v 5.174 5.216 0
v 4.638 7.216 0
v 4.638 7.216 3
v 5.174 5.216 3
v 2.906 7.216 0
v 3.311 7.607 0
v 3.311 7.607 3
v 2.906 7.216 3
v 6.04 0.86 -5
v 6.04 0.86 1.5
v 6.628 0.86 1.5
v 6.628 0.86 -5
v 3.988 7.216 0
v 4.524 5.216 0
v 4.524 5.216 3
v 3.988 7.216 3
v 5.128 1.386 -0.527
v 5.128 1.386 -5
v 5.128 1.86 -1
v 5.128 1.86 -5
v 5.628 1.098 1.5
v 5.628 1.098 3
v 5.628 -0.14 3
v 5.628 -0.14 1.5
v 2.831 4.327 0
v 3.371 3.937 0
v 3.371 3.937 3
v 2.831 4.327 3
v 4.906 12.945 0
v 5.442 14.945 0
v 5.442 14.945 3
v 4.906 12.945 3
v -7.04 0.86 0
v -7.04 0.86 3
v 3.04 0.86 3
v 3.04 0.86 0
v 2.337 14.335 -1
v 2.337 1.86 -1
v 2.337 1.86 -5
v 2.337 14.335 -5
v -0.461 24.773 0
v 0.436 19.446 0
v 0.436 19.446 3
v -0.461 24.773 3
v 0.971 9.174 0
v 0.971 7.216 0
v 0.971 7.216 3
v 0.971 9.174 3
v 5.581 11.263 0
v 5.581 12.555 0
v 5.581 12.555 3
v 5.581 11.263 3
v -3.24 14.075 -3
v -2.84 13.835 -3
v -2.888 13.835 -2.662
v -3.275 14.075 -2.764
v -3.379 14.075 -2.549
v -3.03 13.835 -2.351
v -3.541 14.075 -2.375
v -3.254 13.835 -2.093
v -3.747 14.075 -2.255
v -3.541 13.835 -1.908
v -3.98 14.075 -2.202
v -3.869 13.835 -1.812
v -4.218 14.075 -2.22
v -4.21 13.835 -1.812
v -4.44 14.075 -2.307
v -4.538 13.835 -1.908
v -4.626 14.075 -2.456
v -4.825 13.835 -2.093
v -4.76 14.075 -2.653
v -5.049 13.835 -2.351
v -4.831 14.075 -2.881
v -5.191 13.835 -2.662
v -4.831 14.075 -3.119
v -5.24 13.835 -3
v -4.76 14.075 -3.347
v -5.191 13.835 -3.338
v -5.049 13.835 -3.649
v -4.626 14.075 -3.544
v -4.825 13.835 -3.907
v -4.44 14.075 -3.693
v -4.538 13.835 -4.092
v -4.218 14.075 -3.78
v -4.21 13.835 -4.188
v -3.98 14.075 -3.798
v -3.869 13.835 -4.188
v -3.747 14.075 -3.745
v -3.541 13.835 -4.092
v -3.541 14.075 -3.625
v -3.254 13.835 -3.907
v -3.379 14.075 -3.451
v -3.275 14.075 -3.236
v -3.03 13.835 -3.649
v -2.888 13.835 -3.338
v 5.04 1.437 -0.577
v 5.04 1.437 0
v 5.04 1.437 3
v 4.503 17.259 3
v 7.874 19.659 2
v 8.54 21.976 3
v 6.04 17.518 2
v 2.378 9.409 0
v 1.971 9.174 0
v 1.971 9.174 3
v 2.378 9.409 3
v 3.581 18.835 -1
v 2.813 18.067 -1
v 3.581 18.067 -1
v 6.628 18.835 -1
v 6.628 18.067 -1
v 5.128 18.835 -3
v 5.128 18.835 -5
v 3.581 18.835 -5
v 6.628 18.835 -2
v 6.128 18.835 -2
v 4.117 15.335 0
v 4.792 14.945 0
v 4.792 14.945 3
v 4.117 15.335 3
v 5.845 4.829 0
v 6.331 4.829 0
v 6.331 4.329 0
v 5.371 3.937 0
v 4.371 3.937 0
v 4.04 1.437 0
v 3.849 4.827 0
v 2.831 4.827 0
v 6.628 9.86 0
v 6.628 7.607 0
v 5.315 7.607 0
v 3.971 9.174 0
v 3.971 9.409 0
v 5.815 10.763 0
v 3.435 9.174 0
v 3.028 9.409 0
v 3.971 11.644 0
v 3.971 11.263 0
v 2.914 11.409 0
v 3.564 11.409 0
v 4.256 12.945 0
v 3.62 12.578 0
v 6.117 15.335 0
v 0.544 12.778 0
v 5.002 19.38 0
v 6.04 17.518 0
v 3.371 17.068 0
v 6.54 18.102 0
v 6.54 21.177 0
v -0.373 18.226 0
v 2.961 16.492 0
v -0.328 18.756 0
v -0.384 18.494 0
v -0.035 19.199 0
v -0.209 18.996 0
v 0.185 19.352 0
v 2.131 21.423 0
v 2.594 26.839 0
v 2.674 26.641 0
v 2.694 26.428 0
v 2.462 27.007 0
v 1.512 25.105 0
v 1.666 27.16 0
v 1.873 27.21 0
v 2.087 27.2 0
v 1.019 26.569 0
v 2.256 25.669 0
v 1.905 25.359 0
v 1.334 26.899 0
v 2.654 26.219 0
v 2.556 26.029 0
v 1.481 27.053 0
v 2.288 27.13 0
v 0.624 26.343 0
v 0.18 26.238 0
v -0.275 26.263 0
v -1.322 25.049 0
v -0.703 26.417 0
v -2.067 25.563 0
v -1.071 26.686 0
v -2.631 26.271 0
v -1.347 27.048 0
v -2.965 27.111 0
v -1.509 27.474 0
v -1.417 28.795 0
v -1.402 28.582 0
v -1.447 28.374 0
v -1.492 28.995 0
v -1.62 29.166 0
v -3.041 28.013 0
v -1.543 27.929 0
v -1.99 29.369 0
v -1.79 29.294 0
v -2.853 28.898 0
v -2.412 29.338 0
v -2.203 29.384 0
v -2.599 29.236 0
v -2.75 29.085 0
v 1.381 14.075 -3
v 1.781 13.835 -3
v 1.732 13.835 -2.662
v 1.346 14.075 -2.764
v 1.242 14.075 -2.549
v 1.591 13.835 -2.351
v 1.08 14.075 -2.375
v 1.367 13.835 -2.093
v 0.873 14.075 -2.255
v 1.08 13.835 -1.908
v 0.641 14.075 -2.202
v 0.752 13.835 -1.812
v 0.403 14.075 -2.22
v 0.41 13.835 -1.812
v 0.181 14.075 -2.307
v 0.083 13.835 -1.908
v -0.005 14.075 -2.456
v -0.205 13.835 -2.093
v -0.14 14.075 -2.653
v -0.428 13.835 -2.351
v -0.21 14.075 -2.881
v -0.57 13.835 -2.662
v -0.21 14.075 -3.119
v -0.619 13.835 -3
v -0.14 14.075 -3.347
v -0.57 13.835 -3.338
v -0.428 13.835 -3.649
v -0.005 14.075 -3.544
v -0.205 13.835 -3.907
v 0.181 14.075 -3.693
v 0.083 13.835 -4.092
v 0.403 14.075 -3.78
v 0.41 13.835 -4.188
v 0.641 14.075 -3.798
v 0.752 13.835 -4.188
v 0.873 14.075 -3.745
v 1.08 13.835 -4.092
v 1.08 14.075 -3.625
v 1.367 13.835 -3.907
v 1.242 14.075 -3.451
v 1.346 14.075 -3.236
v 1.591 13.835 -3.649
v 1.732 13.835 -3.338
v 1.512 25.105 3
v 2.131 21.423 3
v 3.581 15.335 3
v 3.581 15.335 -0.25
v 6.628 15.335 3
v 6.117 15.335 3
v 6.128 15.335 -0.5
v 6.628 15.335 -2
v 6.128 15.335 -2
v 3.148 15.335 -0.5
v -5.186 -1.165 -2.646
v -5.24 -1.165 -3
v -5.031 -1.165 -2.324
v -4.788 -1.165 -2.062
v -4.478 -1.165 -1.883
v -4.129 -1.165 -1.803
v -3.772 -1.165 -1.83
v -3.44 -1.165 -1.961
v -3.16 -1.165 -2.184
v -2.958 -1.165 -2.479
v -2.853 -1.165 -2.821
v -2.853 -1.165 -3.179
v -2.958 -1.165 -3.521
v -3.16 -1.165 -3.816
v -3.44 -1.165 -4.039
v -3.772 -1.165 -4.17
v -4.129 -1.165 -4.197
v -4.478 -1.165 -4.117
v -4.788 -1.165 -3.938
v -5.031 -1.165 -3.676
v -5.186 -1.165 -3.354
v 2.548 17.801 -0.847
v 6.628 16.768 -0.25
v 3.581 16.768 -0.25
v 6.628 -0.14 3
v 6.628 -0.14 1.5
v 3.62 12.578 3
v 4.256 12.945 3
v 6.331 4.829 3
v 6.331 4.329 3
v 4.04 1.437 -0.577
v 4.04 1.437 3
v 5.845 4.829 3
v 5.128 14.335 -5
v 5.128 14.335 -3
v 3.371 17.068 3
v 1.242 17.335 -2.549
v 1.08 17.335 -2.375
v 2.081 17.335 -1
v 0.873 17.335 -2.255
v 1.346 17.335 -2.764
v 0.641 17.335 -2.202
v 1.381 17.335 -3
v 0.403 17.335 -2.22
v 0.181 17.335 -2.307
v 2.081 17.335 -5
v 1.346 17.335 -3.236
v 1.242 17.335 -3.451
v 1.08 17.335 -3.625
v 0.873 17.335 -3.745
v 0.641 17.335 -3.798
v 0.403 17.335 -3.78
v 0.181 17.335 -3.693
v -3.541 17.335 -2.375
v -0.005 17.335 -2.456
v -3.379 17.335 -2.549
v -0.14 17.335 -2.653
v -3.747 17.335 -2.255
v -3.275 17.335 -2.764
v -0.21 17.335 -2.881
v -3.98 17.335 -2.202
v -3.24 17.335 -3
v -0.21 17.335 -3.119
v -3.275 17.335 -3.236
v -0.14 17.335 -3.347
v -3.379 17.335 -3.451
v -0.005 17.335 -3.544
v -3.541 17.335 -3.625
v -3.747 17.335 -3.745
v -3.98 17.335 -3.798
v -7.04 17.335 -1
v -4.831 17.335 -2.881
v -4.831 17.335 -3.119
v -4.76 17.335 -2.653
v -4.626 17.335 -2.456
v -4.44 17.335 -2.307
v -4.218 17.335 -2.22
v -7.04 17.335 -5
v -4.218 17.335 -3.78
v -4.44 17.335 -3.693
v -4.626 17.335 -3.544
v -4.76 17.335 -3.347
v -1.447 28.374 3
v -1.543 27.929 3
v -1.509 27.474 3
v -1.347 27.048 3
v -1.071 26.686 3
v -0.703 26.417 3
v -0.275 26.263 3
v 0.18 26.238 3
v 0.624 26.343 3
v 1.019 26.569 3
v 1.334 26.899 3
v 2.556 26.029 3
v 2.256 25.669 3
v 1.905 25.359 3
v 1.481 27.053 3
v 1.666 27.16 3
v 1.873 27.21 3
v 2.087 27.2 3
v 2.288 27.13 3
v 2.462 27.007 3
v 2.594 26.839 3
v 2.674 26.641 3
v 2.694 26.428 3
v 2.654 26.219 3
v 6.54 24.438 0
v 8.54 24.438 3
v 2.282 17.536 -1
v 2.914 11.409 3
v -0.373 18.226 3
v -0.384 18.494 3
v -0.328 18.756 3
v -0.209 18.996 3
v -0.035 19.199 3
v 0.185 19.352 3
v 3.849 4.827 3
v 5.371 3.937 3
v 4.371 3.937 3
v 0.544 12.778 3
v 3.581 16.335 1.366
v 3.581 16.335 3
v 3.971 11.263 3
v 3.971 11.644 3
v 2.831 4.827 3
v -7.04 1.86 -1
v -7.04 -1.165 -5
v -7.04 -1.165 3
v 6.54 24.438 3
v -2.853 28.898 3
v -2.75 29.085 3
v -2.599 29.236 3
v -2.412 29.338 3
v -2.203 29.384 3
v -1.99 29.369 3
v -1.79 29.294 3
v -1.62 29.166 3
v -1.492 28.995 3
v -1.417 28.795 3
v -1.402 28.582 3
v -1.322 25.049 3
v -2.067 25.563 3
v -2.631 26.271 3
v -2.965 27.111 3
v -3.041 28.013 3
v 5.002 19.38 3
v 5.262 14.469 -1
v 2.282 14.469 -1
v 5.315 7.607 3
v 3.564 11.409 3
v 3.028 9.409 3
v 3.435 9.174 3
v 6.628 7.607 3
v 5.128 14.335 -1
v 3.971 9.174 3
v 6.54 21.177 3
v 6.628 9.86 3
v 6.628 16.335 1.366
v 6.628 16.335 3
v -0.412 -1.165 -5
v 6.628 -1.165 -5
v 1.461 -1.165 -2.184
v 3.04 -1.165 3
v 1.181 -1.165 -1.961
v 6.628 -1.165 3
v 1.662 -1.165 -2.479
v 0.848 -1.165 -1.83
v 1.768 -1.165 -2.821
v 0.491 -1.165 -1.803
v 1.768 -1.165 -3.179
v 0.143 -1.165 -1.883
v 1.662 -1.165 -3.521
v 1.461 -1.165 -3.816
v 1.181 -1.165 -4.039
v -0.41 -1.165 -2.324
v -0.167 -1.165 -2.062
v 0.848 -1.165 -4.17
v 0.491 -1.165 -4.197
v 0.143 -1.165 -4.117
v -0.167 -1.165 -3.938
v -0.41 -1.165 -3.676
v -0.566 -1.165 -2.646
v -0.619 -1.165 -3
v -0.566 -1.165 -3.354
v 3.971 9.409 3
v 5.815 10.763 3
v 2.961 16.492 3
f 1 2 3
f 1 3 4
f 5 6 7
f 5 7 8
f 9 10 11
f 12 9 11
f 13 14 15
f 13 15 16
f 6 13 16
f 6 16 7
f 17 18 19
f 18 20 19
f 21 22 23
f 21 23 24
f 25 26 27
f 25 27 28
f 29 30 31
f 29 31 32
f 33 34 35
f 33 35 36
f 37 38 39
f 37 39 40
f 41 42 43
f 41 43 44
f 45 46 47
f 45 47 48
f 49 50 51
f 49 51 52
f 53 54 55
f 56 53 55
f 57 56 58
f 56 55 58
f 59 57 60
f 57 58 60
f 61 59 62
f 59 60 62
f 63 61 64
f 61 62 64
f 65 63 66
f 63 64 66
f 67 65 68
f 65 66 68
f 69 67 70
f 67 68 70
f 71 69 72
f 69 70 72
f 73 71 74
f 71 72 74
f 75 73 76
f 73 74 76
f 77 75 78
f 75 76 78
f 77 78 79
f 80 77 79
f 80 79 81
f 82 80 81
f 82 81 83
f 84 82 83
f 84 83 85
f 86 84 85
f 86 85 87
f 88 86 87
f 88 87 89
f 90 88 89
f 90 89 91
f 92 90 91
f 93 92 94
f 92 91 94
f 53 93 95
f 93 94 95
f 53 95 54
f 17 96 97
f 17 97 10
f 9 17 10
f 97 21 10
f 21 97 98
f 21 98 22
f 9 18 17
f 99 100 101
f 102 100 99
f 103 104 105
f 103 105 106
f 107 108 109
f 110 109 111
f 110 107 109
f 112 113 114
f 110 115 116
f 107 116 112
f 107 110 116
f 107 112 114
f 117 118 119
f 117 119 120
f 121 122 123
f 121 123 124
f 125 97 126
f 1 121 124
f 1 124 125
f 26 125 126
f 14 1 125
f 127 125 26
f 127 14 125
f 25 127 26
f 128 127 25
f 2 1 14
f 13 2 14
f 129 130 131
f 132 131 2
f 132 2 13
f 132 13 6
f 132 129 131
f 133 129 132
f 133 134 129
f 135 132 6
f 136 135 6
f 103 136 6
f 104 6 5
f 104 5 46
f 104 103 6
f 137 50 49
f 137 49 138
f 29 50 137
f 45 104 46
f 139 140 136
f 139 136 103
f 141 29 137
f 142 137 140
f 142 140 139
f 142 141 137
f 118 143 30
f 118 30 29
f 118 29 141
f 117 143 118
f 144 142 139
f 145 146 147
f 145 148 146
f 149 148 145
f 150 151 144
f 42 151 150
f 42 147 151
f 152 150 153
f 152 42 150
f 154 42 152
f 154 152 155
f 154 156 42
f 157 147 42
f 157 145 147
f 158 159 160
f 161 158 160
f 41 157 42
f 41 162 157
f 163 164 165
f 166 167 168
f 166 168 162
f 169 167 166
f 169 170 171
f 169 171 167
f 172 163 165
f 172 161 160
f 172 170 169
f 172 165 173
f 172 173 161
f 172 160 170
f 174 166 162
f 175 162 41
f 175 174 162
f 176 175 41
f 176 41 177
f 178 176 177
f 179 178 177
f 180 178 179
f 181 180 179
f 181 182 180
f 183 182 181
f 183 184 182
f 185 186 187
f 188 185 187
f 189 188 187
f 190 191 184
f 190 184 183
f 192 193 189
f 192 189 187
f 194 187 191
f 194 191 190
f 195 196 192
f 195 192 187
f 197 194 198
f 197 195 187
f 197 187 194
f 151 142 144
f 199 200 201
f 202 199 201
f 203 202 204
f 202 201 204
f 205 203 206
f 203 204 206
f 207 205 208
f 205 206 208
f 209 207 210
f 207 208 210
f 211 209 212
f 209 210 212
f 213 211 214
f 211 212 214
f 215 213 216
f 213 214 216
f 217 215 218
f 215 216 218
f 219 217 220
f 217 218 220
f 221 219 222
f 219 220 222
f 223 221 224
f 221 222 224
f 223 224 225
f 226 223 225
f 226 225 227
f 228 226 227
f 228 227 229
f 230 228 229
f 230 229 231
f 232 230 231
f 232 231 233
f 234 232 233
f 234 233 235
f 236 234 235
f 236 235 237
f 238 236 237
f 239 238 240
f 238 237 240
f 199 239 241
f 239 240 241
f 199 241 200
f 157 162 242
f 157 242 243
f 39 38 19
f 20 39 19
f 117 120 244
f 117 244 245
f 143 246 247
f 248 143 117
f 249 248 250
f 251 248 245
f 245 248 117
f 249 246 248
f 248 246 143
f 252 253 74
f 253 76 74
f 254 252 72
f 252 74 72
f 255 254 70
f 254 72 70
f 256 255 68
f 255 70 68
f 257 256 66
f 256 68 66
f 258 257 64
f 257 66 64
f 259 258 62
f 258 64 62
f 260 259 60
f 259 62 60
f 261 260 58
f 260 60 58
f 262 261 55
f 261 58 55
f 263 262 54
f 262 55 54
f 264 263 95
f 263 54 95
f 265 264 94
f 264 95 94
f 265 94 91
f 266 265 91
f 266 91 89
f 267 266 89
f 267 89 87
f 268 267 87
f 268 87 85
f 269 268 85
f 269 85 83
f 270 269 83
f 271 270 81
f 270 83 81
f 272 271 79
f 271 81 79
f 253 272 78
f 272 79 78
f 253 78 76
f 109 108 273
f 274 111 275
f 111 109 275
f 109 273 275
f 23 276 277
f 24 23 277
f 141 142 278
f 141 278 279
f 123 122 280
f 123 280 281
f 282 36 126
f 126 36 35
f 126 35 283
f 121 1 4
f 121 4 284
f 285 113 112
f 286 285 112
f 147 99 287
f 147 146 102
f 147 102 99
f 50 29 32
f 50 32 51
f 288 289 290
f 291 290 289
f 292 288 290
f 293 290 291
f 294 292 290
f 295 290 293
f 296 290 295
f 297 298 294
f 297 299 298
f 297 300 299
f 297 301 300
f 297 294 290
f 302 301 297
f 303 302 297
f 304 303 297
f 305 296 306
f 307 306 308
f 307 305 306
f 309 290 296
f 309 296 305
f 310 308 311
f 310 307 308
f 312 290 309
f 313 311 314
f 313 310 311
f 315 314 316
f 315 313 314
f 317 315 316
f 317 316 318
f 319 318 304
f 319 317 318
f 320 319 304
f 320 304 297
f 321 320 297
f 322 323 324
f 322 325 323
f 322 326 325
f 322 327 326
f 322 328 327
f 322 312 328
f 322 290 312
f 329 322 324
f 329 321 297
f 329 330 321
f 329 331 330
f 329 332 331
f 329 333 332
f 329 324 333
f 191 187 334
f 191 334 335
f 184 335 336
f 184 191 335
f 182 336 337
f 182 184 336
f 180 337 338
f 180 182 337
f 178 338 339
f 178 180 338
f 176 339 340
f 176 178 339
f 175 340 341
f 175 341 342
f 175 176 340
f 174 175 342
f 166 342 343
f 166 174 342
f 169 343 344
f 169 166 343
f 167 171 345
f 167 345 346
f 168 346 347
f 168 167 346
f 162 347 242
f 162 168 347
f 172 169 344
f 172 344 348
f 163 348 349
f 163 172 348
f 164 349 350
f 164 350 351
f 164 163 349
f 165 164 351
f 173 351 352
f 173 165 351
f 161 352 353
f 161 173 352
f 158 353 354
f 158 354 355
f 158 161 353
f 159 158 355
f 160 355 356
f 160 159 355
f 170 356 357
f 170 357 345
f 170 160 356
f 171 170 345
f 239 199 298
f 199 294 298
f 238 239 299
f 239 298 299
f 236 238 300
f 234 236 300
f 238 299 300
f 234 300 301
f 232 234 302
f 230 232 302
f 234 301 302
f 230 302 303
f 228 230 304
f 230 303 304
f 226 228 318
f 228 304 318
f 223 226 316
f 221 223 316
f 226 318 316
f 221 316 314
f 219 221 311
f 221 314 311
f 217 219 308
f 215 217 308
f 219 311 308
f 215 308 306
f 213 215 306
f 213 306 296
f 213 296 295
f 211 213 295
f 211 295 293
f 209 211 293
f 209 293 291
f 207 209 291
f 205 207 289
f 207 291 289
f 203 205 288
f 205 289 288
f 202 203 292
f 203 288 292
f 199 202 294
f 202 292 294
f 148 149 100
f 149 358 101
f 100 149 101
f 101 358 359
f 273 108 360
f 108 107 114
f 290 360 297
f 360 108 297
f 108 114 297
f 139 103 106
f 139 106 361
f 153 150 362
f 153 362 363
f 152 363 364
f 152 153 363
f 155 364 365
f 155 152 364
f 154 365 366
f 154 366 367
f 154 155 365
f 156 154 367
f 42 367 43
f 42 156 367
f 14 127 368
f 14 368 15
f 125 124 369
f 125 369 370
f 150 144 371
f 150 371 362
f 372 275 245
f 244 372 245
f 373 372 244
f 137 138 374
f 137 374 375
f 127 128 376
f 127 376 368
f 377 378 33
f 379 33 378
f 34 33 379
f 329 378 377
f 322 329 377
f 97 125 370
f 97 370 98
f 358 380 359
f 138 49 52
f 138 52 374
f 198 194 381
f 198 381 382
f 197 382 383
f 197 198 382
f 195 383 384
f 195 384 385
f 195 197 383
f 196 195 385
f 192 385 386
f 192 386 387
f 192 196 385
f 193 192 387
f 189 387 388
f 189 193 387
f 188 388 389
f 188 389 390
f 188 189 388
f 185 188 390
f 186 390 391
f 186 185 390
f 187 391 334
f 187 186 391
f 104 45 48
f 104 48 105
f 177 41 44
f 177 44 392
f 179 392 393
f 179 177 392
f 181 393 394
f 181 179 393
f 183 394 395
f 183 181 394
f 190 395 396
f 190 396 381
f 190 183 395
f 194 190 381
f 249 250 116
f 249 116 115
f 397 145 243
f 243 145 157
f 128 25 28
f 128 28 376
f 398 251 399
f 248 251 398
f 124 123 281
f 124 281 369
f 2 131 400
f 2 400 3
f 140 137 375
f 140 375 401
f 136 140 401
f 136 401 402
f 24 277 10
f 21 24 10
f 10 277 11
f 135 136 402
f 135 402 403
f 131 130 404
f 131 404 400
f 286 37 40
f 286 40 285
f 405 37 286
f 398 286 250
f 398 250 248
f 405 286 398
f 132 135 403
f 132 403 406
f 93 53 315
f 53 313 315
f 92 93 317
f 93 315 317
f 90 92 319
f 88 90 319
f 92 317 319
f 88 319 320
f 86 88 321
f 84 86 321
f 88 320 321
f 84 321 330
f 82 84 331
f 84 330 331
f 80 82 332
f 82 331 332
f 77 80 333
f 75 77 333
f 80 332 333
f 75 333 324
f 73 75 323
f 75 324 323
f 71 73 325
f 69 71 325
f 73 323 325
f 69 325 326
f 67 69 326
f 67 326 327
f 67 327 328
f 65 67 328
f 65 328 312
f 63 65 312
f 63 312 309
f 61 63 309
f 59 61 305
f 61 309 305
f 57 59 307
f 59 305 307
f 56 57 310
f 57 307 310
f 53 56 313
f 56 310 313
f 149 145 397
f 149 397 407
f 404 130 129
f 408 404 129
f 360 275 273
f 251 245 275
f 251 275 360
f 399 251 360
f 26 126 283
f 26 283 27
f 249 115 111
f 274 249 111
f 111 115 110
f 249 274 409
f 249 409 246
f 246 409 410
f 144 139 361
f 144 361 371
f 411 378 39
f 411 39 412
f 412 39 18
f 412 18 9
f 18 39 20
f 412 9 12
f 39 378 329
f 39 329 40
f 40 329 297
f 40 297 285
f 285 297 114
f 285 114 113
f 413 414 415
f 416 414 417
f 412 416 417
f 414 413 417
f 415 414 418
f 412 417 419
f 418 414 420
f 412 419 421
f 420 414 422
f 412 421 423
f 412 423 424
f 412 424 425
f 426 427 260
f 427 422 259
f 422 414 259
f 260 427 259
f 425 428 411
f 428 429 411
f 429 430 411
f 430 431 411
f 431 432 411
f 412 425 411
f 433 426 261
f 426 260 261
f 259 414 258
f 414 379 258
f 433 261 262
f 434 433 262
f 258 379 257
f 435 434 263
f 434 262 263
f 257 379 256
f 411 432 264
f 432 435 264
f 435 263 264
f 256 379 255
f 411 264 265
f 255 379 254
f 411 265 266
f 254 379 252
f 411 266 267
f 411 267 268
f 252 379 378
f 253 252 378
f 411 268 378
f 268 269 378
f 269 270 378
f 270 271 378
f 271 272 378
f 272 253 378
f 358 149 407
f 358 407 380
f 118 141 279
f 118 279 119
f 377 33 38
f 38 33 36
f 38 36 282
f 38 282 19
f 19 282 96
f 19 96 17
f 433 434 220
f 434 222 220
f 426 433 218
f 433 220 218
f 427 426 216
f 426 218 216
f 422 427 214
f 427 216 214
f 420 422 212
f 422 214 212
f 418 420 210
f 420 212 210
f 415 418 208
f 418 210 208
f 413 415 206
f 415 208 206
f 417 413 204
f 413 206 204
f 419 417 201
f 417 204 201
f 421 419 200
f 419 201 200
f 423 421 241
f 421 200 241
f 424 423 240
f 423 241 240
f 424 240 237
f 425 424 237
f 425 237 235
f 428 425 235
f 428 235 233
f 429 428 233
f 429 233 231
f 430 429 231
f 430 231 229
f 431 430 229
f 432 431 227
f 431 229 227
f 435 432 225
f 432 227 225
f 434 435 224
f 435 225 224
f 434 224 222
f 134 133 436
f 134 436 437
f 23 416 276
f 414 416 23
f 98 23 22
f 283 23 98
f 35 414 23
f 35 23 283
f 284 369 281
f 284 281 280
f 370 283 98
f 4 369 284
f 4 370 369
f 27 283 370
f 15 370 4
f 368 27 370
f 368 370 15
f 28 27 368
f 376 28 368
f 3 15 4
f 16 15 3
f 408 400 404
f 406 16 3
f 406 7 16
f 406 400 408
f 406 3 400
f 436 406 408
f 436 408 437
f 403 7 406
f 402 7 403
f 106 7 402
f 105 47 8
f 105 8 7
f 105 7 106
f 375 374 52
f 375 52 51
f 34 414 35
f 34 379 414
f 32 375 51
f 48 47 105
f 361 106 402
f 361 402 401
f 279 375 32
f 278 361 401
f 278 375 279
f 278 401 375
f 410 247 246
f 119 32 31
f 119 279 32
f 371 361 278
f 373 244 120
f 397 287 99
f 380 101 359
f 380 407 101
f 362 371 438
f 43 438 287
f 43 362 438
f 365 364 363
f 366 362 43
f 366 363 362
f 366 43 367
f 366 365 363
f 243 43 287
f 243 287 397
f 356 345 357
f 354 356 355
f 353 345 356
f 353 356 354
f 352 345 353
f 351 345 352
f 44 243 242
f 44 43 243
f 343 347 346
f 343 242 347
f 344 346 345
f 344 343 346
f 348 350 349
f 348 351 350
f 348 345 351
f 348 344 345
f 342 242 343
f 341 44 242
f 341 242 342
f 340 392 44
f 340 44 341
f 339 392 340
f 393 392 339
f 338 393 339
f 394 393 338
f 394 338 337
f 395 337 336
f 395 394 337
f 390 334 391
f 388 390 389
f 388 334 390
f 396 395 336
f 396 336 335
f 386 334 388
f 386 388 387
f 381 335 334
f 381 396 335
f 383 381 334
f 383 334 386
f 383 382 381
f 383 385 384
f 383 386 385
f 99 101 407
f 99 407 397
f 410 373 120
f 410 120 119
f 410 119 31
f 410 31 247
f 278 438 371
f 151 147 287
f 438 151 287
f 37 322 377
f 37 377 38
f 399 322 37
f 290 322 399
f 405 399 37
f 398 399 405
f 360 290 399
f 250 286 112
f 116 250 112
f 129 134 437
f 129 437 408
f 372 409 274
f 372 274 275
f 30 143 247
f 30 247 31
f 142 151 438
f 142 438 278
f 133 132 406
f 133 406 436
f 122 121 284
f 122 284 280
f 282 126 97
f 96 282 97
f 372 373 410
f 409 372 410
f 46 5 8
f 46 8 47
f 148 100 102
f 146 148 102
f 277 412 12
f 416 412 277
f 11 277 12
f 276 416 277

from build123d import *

# Parameters (mm, degrees)
BOSS_SWITCH_BODY_DEPTH                         = 3
SKETCH1_W                                      = 4
SKETCH1_H                                      = 3.5
BOSS_FLANGE_WIDTH_DEPTH                        = 5
BOSS_FLANGE_HEIGHT_REACH                       = 38.166
SKETCH2_W                                      = 4
SKETCH2_H                                      = 2
SKETCH2_W_2                                    = 8
SKETCH2_H_2                                    = 2.024975669
CUT_UP_TO_DOWN_DERAILLEUR_CLEARANCE_REACH      = 23.862
SKETCH10_W                                     = 2.453096586
SKETCH10_H                                     = 3
SKETCH17_W                                     = 12.1675
SKETCH17_H                                     = 4
BOSS_FLANGE_SUPPORT_DEPTH                      = 14.475024331
TAP_DRILL_FOR_M2X0_4_TAP1_D                    = 1.6
M2_CLEARANCE_HOLE2_D                           = 2.4
M2_CLEARANCE_HOLE2_DEPTH                       = 15
M2_CLEARANCE_HOLE2_TIP                         = 0.721032743
CUT_UP_TO_DOWN_CANTILEVER_SLOPE_REACH          = 31.347
CUT_DOWN_TO_UP_DERAILLEUR_CLEARANCE_DEPTH      = 33.69867621
CUT_DOWN_TO_UP_DERAILLEUR_CLEARANCE_DEPTH_BACK = 33.69867621
CHAMFER_FLANGE_SUPPORT_SIZE                    = 1.5
CHAMFER_FLANGE_SUPPORT_2_SIZE                  = 1
CHAMFER_FLANGE_SUPPORT_3_SIZE                  = 1
SKETCH18_W                                     = 1.5
SKETCH18_H                                     = 1.577328106
CUT_DOWN_TO_UP_DERAILLEUR_CLEARANCE_2_DEPTH    = 1
SKETCH19_W                                     = 3.046903414
SKETCH19_H                                     = 2.563581512
CUT_UP_TO_DOWN_CANTILEVER_CLEARANCE_DEPTH      = 1
CHAMFER1_SIZE                                  = 1
CHAMFER1_SIZE_2                                = 1.732050808
CHAMFER3_SIZE                                  = 0.75
CHAMFER3_SIZE_2                                = 1.299038106
CHAMFER4_SIZE                                  = 0.866025404
CHAMFER4_SIZE2                                 = 0.5
CHAMFER5_SIZE                                  = 0.5
CHAMFER6_SIZE                                  = 2.5
CHAMFER7_SIZE                                  = 1
CUT_EXTRUDE3_REACH                             = 33.008
CHAMFER8_SIZE                                  = 0.5
CHAMFER8_SIZE2                                 = 1.366025404
SKETCH23_W                                     = 2.791062273
SKETCH23_H                                     = 12.475024331
CUT_EXTRUDE4_DEPTH                             = 31.862053717


# Some blends are built 0.0001 mm under size
with BuildPart() as part:
    # Sketch-SwitchBossUp → Boss-Switch Body (new body)
    with BuildSketch(Plane.XY):
        with BuildLine():
            Line((6.540476927, 21.177422148), (6.540476927, 24.438379064))
            Line((6.540476927, 24.438379064), (8.540476927, 24.438379064))
            Line((8.540476927, 24.438379064), (8.540476927, 20.438379064))
            Line((8.540476927, 20.438379064), (6.040476927, 17.517528279))
            Line((6.040476927, 17.517528279), (2.878366495, 16.985217616))
            Line((2.878366495, 16.985217616), (3.620297651, 12.577888564))
            Line((3.620297651, 12.577888564), (4.256080915, 12.944958203))
            Line((4.256080915, 12.944958203), (4.791964496, 14.944962169))
            Line((4.791964496, 14.944962169), (4.116925685, 15.334689347))
            Line((4.116925685, 15.334689347), (3.581073513, 15.334689347))
            Line((3.581073513, 15.334689347), (3.581073513, 16.334689347))
            Line((3.581073513, 16.334689347), (6.857327822, 16.334689347))
            Line((6.857327822, 16.334689347), (13.441607507, 16.334689347))
            Line((13.441607507, 16.334689347), (13.441607507, -1.165310653))
            Line((13.441607507, -1.165310653), (5.040476927, -1.165310653))
            Line((5.040476927, -1.165310653), (3.040476927, -1.165310653))
            Line((3.040476927, -1.165310653), (3.040476927, 0.859665016))
            Line((3.040476927, 0.859665016), (4.040476927, 1.437015286))
            Line((4.040476927, 1.437015286), (3.370603946, 3.937015286))
            Line((3.370603946, 3.937015286), (2.83114552, 4.326718942))
            Line((2.83114552, 4.326718942), (2.83114552, 4.826718942))
            Line((2.83114552, 4.826718942), (3.58114552, 4.826718942))
            Line((3.58114552, 4.826718942), (3.849107629, 4.826718942))
            Line((3.849107629, 4.826718942), (4.524094713, 5.216429578))
            Line((4.524094713, 5.216429578), (3.988181525, 7.216425611))
            Line((3.988181525, 7.216425611), (3.311378308, 7.607171452))
            Line((3.311378308, 7.607171452), (2.9061262, 7.216422599))
            Line((2.9061262, 7.216422599), (0.971280482, 7.216422599))
            Line((0.971280482, 7.216422599), (0.971280482, 9.174382361))
            Line((0.971280482, 9.174382361), (1.971280482, 9.174382361))
            Line((1.971280482, 9.174382361), (2.378329551, 9.409396267))
            Line((2.378329551, 9.409396267), (2.914213132, 11.409400234))
            Line((2.914213132, 11.409400234), (0.544476723, 12.777544801))
            Line((0.544476723, 12.777544801), (-0.372784255, 18.226393961))
            ThreePointArc((-0.372784255, 18.226393961), (-0.209313172, 18.996084896), (0.435897335, 19.446473985))
            Line((0.435897335, 19.446473985), (-0.46073685, 24.772792819))
            ThreePointArc((-0.46073685, 24.772792819), (-2.630501593, 26.270619745), (-2.852546321, 28.897797067))
            ThreePointArc((-2.852546321, 28.897797067), (-1.887813913, 29.338582026), (-1.447028953, 28.373849618))
            ThreePointArc((-1.447028953, 28.373849618), (-0.703448682, 26.416936722), (1.333779254, 26.898727173))
            ThreePointArc((1.333779254, 26.898727173), (2.379722745, 27.074801628), (2.555797201, 26.028858137))
            ThreePointArc((2.555797201, 26.028858137), (2.086504637, 25.507104397), (1.511513111, 25.104801997))
            Line((1.511513111, 25.104801997), (2.546357317, 18.957467576))
            Line((2.546357317, 18.957467576), (4.992893704, 19.36931828))
            Line((4.992893704, 19.36931828), (6.540476927, 21.177422148))
        make_face()
        Polygon((5.581091201, 12.555245643), (5.581100766, 11.263016278), (3.971265023, 11.263016278), (3.97126394, 11.644419955), (3.564213132, 11.409405045), (3.028329551, 9.409401078), (3.435400868, 9.174382361), (3.971278743, 9.174382361), (3.971278743, 9.409408058), (5.815189335, 10.763016278), (6.627976927, 9.860324206), (6.627976927, 8.365258971), (6.627976927, 7.607171452), (5.314953271, 7.607171452), (4.638181525, 7.216430422), (5.174094713, 5.216434389), (5.845334952, 4.828900281), (6.33114552, 4.828900281), (6.33114552, 4.328900281), (5.370603946, 3.937015286), (4.370603946, 3.937015286), (5.040476927, 1.437015286), (6.040489723, 0.85968718), (9.127976927, 0.85968718), (10.437466736, 2.169176988), (10.437466736, 14.025199539), (9.127976927, 15.334689347), (6.116971898, 15.334689347), (5.441964496, 14.94496698), (4.906080915, 12.944963014), align=None, mode=Mode.SUBTRACT)
    extrude(amount=BOSS_SWITCH_BODY_DEPTH)

    # Sketch1 → Boss-Flange Width (add)
    with BuildSketch(Plane(origin=(0, 0, 0), x_dir=(-1, 0, 0), z_dir=(0, 0, -1))):
        Polygon((-7.581073513, -1.165310653), (0.412170615, -1.165310653), (0.412170615, 0.859665016), (-3.040476927, 0.859665016), (-4.040476927, 1.437015286), (-5.040476927, 1.437015286), (-6.040489723, 0.85968718), (-7.581073513, 0.85968718), align=None)
        with Locations((-5.581073513, 17.084689347)):
            Rectangle(SKETCH1_W, SKETCH1_H)
    extrude(amount=BOSS_FLANGE_WIDTH_DEPTH)

    # Sketch2 → Boss-Flange Height (add, up to next)
    with BuildSketch(Plane(origin=(-7.039523073, 0, 0), x_dir=(0, 0, -1), z_dir=(1, 0, 0)), mode=Mode.PRIVATE) as boss_flange_height_sk1:
        with Locations((3, 16.334689347)):
            Rectangle(SKETCH2_W, SKETCH2_H)
    boss_flange_height_tool1 = extrude(boss_flange_height_sk1.sketch, amount=BOSS_FLANGE_HEIGHT_REACH, mode=Mode.PRIVATE) - part.part
    # Sketch2 → Boss-Flange Height (add, up to next)
    with BuildSketch(Plane(origin=(-7.039523073, 0, 0), x_dir=(0, 0, -1), z_dir=(1, 0, 0)), mode=Mode.PRIVATE) as boss_flange_height_sk2:
        with Locations((1, -0.152822819)):
            Rectangle(SKETCH2_W_2, SKETCH2_H_2)
    boss_flange_height_tool2 = extrude(boss_flange_height_sk2.sketch, amount=BOSS_FLANGE_HEIGHT_REACH, mode=Mode.PRIVATE) - part.part
    add(boss_flange_height_tool1.solids().sort_by_distance((-7.039523, 16.334689, -3))[0])
    add(boss_flange_height_tool2.solids().sort_by_distance((-7.039523, -0.152823, -1))[0])

    # Sketch10 → Cut-Up-To-Down Derailleur Clearance (cut, up to next)
    with BuildSketch(Plane(origin=(0, 15.334689347, 0), x_dir=(1, 0, 0), z_dir=(0, 1, 0)), mode=Mode.PRIVATE) as cut_up_to_down_derailleur_clearance_sk1:
        with Locations((6.35452522, 3.5)):
            Rectangle(SKETCH10_W, SKETCH10_H)
    cut_up_to_down_derailleur_clearance_tool1 = extrude(cut_up_to_down_derailleur_clearance_sk1.sketch, amount=CUT_UP_TO_DOWN_DERAILLEUR_CLEARANCE_REACH, mode=Mode.PRIVATE) & part.part
    add(cut_up_to_down_derailleur_clearance_tool1.solids().sort_by_distance((6.354525, 15.334689, -3.5))[0], mode=Mode.SUBTRACT)

    # Sketch17 → Boss-Flange Support (add)
    with BuildSketch(Plane.XZ.offset(-15.334689347)):
        with Locations((-0.955773073, -3)):
            Rectangle(SKETCH17_W, SKETCH17_H)
    extrude(amount=BOSS_FLANGE_SUPPORT_DEPTH)

    # Tap Drill for M2x0.4 Tap1 (through all)
    with Locations(Plane(origin=(0, -1.165310653, 0), x_dir=(-1, 0, 0), z_dir=(0, -1, 0))):
        with Locations((4.039523073, 3), (-0.581073513, 3)):
            Hole(TAP_DRILL_FOR_M2X0_4_TAP1_D / 2)

    # M2 Clearance Hole2
    with Locations(Plane.XZ.offset(1.165310653)):
        with Locations((-4.039523073, -3), (0.581073513, -3)):
            Hole(M2_CLEARANCE_HOLE2_D / 2, depth=M2_CLEARANCE_HOLE2_DEPTH)
            with Locations((0, 0, -(M2_CLEARANCE_HOLE2_DEPTH + M2_CLEARANCE_HOLE2_TIP / 2))):  # 118° drill point
                Cone(0, M2_CLEARANCE_HOLE2_D / 2, M2_CLEARANCE_HOLE2_TIP, mode=Mode.SUBTRACT)

    # Sketch12 → Cut-Up-to-Down Cantilever Slope (cut, up to next)
    with BuildSketch(Plane(origin=(0, 24.438379064, 0), x_dir=(1, 0, 0), z_dir=(0, 1, 0)), mode=Mode.PRIVATE) as cut_up_to_down_cantilever_slope_sk1:
        Polygon((6.540476927, 0), (8.540476927, -3), (8.540476927, 0), align=None)
    cut_up_to_down_cantilever_slope_tool1 = extrude(cut_up_to_down_cantilever_slope_sk1.sketch, amount=-CUT_UP_TO_DOWN_CANTILEVER_SLOPE_REACH, mode=Mode.PRIVATE) & part.part
    add(cut_up_to_down_cantilever_slope_tool1.solids().sort_by_distance((7.87381, 24.438379, 1))[0], mode=Mode.SUBTRACT)

    # Sketch16 → Cut-Down-to-Up Derailleur Clearance (cut, two sides: drawn at the far end of the back side and taken through both)
    with BuildSketch(Plane(origin=(0, 0, 0), x_dir=(-1, 0, 0), z_dir=(0, 0, -1)).offset(-CUT_DOWN_TO_UP_DERAILLEUR_CLEARANCE_DEPTH_BACK)):
        Polygon((-7.581073513, 18.834689347), (-13.441607507, 18.834689347), (-13.441607507, -1.165310653), (-6.627976927, -1.165310653), (-6.627976927, 5.203794929), (-8.003689255, 5.203794929), (-8.003689255, 12.048417413), (-6.627976927, 12.048417413), (-6.627976927, 17.947659965), align=None)
    extrude(amount=CUT_DOWN_TO_UP_DERAILLEUR_CLEARANCE_DEPTH + CUT_DOWN_TO_UP_DERAILLEUR_CLEARANCE_DEPTH_BACK, mode=Mode.SUBTRACT)

    # Chamfer-Flange Support
    chamfer_flange_support_edges = [part.edges().sort_by_distance(p)[0] for p in [
        (3.581073513, 17.334689347, -3),
    ]]
    chamfer(chamfer_flange_support_edges, length=CHAMFER_FLANGE_SUPPORT_SIZE - 0.0001)  # a hair under: the kernel refuses the full size

    # Chamfer-Flange Support 2
    chamfer_flange_support_2_edges = [part.edges().sort_by_distance(p)[0] for p in [
        (5.127976927, 17.084689347, -2),
        (5.127976927, 15.334689347, -1.5),
    ]]
    chamfer(chamfer_flange_support_2_edges, length=CHAMFER_FLANGE_SUPPORT_2_SIZE)

    # Chamfer-Flange Support 3
    chamfer_flange_support_3_edges = [part.edges().sort_by_distance(p)[0] for p in [
        (-1.999523073, 0.859665016, -1),
    ]]
    chamfer(chamfer_flange_support_3_edges, length=CHAMFER_FLANGE_SUPPORT_3_SIZE)

    # Sketch18 → Cut-Down-to-Up Derailleur Clearance 2 (cut)
    with BuildSketch(Plane(origin=(6.627976927, 0, 0), x_dir=(0, 0, -1), z_dir=(1, 0, 0))):
        with Locations((-2.25, 0.648351233)):
            Rectangle(SKETCH18_W, SKETCH18_H)
    extrude(amount=-CUT_DOWN_TO_UP_DERAILLEUR_CLEARANCE_2_DEPTH, mode=Mode.SUBTRACT)

    # Sketch19 → Cut-Up-to-Down Cantilever Clearance (cut)
    with BuildSketch(Plane.XY):
        with Locations((5.10452522, 17.616480103)):
            Rectangle(SKETCH19_W, SKETCH19_H)
    extrude(amount=-CUT_UP_TO_DOWN_CANTILEVER_CLEARANCE_DEPTH, mode=Mode.SUBTRACT)

    # Chamfer1
    # the kernel refuses this chamfer: 1.732050808, 1 mm, written as the material it adds along each edge
    with BuildSketch(Plane(origin=(6.627976927, 16.334689347, -1), x_dir=(0, -0.05789386240266977, 0.9983227437537926), z_dir=(-1, 0, 0))) as chamfer1_piece_1:
        Polygon((CHAMFER1_SIZE * 0.998322743754, CHAMFER1_SIZE * 0.0578938624027), (-CHAMFER1_SIZE_2 * 0.0578938623883, CHAMFER1_SIZE_2 * 0.998322743505), (0, 0), align=None)
    extrude(amount=3.046903414)

    # Chamfer3
    # the kernel refuses this chamfer: 1.299038106, 0.75 mm, written as the material it adds along each edge
    with BuildSketch(Plane(origin=(3.581073513, 15.334689347, -1), x_dir=(0.05789386240236086, -1.5934376059306423e-13, 0.9983227437538106), z_dir=(0, 1, 0))) as chamfer3_piece_1_section:
        Polygon((CHAMFER3_SIZE * 0.998322743754, -CHAMFER3_SIZE * 0.0578938624027), (-CHAMFER3_SIZE_2 * 0.057893862388, -CHAMFER3_SIZE_2 * 0.998322743505), (0, 0), align=None)
    chamfer3_piece_1 = extrude(amount=6.092773786, mode=Mode.PRIVATE)
    chamfer3_piece_1 = split(chamfer3_piece_1, bisect_by=Plane(origin=(3.127107762, 16.799062109, -0.268105739), z_dir=(0, -0.4999999999999566, -0.8660254037844637)), keep=Keep.TOP, mode=Mode.PRIVATE)
    chamfer3_piece_1 = split(chamfer3_piece_1, bisect_by=Plane(origin=(2.18713947, 17.440655304, -0.784906566), z_dir=(0.7071067811865476, -0.7071067811865476, 0)), keep=Keep.TOP, mode=Mode.PRIVATE)
    add(chamfer3_piece_1)

    # Chamfer4
    chamfer4_edges = [part.edges().sort_by_distance(p)[0] for p in [
        (4.205006167, 15.334689347, -1),
    ]]
    chamfer4_side = [part.faces().sort_by_distance(p)[0] for p in [
        (-1.082771879, 9.403372689, -1),
    ]]
    chamfer(chamfer4_edges, length=CHAMFER4_SIZE, length2=CHAMFER4_SIZE2, reference=chamfer4_side[0])

    # Chamfer5
    chamfer5_edges = [part.edges().sort_by_distance(p)[0] for p in [
        (2.878366495, 16.985217616, 1.5),
    ]]
    chamfer(chamfer5_edges, length=CHAMFER5_SIZE)

    # Chamfer6
    # the kernel refuses this chamfer: 2.5 mm, written as the material it adds along each edge
    with BuildSketch(Plane(origin=(2.546357317, 18.957467576, 0), x_dir=(0.9903165846799726, 0.13882745444541758, 0), z_dir=(0, 0, 1))) as chamfer6_piece_1:
        Polygon((CHAMFER6_SIZE * 0.999621916911, CHAMFER6_SIZE * 0.0274958766106), (-CHAMFER6_SIZE * 0.0274958766106, CHAMFER6_SIZE * 0.999621916911), (0, 0), align=None)
    extrude(amount=3)

    # Chamfer7
    chamfer7_edges = [part.edges().sort_by_distance(p)[0] for p in [
        (7.290476927, 18.977953671, 3),
    ]]
    chamfer(chamfer7_edges, length=CHAMFER7_SIZE)

    # Sketch22 → Cut-Extrude3 (cut, up to next)
    with BuildSketch(Plane.XY, mode=Mode.PRIVATE) as cut_extrude3_sk1:
        Polygon((6.627976927, 17.947659965), (7.581073513, 18.834689347), (6.627976927, 18.834689347), align=None)
    cut_extrude3_tool1 = extrude(cut_extrude3_sk1.sketch, amount=-CUT_EXTRUDE3_REACH, mode=Mode.PRIVATE) & part.part
    add(cut_extrude3_tool1.solids().sort_by_distance((6.945676, 18.539013, 0))[0], mode=Mode.SUBTRACT)

    # Chamfer8
    chamfer8_edges = [part.edges().sort_by_distance(p)[0] for p in [
        (5.10452522, 16.334689347, 0),
    ]]
    chamfer8_side = [part.faces().sort_by_distance(p)[0] for p in [
        (4.861507649, 17.252033573, -0.529628936),
    ]]
    chamfer(chamfer8_edges, length=CHAMFER8_SIZE, length2=CHAMFER8_SIZE2, reference=chamfer8_side[0])

    # Sketch23 → Cut-Extrude4 (cut, through all)
    with BuildSketch(Plane.XY.offset(-1)):
        with Locations((3.732445791, 8.097177182)):
            Rectangle(SKETCH23_W, SKETCH23_H)
    extrude(amount=-CUT_EXTRUDE4_DEPTH, mode=Mode.SUBTRACT)


solid = part.part
